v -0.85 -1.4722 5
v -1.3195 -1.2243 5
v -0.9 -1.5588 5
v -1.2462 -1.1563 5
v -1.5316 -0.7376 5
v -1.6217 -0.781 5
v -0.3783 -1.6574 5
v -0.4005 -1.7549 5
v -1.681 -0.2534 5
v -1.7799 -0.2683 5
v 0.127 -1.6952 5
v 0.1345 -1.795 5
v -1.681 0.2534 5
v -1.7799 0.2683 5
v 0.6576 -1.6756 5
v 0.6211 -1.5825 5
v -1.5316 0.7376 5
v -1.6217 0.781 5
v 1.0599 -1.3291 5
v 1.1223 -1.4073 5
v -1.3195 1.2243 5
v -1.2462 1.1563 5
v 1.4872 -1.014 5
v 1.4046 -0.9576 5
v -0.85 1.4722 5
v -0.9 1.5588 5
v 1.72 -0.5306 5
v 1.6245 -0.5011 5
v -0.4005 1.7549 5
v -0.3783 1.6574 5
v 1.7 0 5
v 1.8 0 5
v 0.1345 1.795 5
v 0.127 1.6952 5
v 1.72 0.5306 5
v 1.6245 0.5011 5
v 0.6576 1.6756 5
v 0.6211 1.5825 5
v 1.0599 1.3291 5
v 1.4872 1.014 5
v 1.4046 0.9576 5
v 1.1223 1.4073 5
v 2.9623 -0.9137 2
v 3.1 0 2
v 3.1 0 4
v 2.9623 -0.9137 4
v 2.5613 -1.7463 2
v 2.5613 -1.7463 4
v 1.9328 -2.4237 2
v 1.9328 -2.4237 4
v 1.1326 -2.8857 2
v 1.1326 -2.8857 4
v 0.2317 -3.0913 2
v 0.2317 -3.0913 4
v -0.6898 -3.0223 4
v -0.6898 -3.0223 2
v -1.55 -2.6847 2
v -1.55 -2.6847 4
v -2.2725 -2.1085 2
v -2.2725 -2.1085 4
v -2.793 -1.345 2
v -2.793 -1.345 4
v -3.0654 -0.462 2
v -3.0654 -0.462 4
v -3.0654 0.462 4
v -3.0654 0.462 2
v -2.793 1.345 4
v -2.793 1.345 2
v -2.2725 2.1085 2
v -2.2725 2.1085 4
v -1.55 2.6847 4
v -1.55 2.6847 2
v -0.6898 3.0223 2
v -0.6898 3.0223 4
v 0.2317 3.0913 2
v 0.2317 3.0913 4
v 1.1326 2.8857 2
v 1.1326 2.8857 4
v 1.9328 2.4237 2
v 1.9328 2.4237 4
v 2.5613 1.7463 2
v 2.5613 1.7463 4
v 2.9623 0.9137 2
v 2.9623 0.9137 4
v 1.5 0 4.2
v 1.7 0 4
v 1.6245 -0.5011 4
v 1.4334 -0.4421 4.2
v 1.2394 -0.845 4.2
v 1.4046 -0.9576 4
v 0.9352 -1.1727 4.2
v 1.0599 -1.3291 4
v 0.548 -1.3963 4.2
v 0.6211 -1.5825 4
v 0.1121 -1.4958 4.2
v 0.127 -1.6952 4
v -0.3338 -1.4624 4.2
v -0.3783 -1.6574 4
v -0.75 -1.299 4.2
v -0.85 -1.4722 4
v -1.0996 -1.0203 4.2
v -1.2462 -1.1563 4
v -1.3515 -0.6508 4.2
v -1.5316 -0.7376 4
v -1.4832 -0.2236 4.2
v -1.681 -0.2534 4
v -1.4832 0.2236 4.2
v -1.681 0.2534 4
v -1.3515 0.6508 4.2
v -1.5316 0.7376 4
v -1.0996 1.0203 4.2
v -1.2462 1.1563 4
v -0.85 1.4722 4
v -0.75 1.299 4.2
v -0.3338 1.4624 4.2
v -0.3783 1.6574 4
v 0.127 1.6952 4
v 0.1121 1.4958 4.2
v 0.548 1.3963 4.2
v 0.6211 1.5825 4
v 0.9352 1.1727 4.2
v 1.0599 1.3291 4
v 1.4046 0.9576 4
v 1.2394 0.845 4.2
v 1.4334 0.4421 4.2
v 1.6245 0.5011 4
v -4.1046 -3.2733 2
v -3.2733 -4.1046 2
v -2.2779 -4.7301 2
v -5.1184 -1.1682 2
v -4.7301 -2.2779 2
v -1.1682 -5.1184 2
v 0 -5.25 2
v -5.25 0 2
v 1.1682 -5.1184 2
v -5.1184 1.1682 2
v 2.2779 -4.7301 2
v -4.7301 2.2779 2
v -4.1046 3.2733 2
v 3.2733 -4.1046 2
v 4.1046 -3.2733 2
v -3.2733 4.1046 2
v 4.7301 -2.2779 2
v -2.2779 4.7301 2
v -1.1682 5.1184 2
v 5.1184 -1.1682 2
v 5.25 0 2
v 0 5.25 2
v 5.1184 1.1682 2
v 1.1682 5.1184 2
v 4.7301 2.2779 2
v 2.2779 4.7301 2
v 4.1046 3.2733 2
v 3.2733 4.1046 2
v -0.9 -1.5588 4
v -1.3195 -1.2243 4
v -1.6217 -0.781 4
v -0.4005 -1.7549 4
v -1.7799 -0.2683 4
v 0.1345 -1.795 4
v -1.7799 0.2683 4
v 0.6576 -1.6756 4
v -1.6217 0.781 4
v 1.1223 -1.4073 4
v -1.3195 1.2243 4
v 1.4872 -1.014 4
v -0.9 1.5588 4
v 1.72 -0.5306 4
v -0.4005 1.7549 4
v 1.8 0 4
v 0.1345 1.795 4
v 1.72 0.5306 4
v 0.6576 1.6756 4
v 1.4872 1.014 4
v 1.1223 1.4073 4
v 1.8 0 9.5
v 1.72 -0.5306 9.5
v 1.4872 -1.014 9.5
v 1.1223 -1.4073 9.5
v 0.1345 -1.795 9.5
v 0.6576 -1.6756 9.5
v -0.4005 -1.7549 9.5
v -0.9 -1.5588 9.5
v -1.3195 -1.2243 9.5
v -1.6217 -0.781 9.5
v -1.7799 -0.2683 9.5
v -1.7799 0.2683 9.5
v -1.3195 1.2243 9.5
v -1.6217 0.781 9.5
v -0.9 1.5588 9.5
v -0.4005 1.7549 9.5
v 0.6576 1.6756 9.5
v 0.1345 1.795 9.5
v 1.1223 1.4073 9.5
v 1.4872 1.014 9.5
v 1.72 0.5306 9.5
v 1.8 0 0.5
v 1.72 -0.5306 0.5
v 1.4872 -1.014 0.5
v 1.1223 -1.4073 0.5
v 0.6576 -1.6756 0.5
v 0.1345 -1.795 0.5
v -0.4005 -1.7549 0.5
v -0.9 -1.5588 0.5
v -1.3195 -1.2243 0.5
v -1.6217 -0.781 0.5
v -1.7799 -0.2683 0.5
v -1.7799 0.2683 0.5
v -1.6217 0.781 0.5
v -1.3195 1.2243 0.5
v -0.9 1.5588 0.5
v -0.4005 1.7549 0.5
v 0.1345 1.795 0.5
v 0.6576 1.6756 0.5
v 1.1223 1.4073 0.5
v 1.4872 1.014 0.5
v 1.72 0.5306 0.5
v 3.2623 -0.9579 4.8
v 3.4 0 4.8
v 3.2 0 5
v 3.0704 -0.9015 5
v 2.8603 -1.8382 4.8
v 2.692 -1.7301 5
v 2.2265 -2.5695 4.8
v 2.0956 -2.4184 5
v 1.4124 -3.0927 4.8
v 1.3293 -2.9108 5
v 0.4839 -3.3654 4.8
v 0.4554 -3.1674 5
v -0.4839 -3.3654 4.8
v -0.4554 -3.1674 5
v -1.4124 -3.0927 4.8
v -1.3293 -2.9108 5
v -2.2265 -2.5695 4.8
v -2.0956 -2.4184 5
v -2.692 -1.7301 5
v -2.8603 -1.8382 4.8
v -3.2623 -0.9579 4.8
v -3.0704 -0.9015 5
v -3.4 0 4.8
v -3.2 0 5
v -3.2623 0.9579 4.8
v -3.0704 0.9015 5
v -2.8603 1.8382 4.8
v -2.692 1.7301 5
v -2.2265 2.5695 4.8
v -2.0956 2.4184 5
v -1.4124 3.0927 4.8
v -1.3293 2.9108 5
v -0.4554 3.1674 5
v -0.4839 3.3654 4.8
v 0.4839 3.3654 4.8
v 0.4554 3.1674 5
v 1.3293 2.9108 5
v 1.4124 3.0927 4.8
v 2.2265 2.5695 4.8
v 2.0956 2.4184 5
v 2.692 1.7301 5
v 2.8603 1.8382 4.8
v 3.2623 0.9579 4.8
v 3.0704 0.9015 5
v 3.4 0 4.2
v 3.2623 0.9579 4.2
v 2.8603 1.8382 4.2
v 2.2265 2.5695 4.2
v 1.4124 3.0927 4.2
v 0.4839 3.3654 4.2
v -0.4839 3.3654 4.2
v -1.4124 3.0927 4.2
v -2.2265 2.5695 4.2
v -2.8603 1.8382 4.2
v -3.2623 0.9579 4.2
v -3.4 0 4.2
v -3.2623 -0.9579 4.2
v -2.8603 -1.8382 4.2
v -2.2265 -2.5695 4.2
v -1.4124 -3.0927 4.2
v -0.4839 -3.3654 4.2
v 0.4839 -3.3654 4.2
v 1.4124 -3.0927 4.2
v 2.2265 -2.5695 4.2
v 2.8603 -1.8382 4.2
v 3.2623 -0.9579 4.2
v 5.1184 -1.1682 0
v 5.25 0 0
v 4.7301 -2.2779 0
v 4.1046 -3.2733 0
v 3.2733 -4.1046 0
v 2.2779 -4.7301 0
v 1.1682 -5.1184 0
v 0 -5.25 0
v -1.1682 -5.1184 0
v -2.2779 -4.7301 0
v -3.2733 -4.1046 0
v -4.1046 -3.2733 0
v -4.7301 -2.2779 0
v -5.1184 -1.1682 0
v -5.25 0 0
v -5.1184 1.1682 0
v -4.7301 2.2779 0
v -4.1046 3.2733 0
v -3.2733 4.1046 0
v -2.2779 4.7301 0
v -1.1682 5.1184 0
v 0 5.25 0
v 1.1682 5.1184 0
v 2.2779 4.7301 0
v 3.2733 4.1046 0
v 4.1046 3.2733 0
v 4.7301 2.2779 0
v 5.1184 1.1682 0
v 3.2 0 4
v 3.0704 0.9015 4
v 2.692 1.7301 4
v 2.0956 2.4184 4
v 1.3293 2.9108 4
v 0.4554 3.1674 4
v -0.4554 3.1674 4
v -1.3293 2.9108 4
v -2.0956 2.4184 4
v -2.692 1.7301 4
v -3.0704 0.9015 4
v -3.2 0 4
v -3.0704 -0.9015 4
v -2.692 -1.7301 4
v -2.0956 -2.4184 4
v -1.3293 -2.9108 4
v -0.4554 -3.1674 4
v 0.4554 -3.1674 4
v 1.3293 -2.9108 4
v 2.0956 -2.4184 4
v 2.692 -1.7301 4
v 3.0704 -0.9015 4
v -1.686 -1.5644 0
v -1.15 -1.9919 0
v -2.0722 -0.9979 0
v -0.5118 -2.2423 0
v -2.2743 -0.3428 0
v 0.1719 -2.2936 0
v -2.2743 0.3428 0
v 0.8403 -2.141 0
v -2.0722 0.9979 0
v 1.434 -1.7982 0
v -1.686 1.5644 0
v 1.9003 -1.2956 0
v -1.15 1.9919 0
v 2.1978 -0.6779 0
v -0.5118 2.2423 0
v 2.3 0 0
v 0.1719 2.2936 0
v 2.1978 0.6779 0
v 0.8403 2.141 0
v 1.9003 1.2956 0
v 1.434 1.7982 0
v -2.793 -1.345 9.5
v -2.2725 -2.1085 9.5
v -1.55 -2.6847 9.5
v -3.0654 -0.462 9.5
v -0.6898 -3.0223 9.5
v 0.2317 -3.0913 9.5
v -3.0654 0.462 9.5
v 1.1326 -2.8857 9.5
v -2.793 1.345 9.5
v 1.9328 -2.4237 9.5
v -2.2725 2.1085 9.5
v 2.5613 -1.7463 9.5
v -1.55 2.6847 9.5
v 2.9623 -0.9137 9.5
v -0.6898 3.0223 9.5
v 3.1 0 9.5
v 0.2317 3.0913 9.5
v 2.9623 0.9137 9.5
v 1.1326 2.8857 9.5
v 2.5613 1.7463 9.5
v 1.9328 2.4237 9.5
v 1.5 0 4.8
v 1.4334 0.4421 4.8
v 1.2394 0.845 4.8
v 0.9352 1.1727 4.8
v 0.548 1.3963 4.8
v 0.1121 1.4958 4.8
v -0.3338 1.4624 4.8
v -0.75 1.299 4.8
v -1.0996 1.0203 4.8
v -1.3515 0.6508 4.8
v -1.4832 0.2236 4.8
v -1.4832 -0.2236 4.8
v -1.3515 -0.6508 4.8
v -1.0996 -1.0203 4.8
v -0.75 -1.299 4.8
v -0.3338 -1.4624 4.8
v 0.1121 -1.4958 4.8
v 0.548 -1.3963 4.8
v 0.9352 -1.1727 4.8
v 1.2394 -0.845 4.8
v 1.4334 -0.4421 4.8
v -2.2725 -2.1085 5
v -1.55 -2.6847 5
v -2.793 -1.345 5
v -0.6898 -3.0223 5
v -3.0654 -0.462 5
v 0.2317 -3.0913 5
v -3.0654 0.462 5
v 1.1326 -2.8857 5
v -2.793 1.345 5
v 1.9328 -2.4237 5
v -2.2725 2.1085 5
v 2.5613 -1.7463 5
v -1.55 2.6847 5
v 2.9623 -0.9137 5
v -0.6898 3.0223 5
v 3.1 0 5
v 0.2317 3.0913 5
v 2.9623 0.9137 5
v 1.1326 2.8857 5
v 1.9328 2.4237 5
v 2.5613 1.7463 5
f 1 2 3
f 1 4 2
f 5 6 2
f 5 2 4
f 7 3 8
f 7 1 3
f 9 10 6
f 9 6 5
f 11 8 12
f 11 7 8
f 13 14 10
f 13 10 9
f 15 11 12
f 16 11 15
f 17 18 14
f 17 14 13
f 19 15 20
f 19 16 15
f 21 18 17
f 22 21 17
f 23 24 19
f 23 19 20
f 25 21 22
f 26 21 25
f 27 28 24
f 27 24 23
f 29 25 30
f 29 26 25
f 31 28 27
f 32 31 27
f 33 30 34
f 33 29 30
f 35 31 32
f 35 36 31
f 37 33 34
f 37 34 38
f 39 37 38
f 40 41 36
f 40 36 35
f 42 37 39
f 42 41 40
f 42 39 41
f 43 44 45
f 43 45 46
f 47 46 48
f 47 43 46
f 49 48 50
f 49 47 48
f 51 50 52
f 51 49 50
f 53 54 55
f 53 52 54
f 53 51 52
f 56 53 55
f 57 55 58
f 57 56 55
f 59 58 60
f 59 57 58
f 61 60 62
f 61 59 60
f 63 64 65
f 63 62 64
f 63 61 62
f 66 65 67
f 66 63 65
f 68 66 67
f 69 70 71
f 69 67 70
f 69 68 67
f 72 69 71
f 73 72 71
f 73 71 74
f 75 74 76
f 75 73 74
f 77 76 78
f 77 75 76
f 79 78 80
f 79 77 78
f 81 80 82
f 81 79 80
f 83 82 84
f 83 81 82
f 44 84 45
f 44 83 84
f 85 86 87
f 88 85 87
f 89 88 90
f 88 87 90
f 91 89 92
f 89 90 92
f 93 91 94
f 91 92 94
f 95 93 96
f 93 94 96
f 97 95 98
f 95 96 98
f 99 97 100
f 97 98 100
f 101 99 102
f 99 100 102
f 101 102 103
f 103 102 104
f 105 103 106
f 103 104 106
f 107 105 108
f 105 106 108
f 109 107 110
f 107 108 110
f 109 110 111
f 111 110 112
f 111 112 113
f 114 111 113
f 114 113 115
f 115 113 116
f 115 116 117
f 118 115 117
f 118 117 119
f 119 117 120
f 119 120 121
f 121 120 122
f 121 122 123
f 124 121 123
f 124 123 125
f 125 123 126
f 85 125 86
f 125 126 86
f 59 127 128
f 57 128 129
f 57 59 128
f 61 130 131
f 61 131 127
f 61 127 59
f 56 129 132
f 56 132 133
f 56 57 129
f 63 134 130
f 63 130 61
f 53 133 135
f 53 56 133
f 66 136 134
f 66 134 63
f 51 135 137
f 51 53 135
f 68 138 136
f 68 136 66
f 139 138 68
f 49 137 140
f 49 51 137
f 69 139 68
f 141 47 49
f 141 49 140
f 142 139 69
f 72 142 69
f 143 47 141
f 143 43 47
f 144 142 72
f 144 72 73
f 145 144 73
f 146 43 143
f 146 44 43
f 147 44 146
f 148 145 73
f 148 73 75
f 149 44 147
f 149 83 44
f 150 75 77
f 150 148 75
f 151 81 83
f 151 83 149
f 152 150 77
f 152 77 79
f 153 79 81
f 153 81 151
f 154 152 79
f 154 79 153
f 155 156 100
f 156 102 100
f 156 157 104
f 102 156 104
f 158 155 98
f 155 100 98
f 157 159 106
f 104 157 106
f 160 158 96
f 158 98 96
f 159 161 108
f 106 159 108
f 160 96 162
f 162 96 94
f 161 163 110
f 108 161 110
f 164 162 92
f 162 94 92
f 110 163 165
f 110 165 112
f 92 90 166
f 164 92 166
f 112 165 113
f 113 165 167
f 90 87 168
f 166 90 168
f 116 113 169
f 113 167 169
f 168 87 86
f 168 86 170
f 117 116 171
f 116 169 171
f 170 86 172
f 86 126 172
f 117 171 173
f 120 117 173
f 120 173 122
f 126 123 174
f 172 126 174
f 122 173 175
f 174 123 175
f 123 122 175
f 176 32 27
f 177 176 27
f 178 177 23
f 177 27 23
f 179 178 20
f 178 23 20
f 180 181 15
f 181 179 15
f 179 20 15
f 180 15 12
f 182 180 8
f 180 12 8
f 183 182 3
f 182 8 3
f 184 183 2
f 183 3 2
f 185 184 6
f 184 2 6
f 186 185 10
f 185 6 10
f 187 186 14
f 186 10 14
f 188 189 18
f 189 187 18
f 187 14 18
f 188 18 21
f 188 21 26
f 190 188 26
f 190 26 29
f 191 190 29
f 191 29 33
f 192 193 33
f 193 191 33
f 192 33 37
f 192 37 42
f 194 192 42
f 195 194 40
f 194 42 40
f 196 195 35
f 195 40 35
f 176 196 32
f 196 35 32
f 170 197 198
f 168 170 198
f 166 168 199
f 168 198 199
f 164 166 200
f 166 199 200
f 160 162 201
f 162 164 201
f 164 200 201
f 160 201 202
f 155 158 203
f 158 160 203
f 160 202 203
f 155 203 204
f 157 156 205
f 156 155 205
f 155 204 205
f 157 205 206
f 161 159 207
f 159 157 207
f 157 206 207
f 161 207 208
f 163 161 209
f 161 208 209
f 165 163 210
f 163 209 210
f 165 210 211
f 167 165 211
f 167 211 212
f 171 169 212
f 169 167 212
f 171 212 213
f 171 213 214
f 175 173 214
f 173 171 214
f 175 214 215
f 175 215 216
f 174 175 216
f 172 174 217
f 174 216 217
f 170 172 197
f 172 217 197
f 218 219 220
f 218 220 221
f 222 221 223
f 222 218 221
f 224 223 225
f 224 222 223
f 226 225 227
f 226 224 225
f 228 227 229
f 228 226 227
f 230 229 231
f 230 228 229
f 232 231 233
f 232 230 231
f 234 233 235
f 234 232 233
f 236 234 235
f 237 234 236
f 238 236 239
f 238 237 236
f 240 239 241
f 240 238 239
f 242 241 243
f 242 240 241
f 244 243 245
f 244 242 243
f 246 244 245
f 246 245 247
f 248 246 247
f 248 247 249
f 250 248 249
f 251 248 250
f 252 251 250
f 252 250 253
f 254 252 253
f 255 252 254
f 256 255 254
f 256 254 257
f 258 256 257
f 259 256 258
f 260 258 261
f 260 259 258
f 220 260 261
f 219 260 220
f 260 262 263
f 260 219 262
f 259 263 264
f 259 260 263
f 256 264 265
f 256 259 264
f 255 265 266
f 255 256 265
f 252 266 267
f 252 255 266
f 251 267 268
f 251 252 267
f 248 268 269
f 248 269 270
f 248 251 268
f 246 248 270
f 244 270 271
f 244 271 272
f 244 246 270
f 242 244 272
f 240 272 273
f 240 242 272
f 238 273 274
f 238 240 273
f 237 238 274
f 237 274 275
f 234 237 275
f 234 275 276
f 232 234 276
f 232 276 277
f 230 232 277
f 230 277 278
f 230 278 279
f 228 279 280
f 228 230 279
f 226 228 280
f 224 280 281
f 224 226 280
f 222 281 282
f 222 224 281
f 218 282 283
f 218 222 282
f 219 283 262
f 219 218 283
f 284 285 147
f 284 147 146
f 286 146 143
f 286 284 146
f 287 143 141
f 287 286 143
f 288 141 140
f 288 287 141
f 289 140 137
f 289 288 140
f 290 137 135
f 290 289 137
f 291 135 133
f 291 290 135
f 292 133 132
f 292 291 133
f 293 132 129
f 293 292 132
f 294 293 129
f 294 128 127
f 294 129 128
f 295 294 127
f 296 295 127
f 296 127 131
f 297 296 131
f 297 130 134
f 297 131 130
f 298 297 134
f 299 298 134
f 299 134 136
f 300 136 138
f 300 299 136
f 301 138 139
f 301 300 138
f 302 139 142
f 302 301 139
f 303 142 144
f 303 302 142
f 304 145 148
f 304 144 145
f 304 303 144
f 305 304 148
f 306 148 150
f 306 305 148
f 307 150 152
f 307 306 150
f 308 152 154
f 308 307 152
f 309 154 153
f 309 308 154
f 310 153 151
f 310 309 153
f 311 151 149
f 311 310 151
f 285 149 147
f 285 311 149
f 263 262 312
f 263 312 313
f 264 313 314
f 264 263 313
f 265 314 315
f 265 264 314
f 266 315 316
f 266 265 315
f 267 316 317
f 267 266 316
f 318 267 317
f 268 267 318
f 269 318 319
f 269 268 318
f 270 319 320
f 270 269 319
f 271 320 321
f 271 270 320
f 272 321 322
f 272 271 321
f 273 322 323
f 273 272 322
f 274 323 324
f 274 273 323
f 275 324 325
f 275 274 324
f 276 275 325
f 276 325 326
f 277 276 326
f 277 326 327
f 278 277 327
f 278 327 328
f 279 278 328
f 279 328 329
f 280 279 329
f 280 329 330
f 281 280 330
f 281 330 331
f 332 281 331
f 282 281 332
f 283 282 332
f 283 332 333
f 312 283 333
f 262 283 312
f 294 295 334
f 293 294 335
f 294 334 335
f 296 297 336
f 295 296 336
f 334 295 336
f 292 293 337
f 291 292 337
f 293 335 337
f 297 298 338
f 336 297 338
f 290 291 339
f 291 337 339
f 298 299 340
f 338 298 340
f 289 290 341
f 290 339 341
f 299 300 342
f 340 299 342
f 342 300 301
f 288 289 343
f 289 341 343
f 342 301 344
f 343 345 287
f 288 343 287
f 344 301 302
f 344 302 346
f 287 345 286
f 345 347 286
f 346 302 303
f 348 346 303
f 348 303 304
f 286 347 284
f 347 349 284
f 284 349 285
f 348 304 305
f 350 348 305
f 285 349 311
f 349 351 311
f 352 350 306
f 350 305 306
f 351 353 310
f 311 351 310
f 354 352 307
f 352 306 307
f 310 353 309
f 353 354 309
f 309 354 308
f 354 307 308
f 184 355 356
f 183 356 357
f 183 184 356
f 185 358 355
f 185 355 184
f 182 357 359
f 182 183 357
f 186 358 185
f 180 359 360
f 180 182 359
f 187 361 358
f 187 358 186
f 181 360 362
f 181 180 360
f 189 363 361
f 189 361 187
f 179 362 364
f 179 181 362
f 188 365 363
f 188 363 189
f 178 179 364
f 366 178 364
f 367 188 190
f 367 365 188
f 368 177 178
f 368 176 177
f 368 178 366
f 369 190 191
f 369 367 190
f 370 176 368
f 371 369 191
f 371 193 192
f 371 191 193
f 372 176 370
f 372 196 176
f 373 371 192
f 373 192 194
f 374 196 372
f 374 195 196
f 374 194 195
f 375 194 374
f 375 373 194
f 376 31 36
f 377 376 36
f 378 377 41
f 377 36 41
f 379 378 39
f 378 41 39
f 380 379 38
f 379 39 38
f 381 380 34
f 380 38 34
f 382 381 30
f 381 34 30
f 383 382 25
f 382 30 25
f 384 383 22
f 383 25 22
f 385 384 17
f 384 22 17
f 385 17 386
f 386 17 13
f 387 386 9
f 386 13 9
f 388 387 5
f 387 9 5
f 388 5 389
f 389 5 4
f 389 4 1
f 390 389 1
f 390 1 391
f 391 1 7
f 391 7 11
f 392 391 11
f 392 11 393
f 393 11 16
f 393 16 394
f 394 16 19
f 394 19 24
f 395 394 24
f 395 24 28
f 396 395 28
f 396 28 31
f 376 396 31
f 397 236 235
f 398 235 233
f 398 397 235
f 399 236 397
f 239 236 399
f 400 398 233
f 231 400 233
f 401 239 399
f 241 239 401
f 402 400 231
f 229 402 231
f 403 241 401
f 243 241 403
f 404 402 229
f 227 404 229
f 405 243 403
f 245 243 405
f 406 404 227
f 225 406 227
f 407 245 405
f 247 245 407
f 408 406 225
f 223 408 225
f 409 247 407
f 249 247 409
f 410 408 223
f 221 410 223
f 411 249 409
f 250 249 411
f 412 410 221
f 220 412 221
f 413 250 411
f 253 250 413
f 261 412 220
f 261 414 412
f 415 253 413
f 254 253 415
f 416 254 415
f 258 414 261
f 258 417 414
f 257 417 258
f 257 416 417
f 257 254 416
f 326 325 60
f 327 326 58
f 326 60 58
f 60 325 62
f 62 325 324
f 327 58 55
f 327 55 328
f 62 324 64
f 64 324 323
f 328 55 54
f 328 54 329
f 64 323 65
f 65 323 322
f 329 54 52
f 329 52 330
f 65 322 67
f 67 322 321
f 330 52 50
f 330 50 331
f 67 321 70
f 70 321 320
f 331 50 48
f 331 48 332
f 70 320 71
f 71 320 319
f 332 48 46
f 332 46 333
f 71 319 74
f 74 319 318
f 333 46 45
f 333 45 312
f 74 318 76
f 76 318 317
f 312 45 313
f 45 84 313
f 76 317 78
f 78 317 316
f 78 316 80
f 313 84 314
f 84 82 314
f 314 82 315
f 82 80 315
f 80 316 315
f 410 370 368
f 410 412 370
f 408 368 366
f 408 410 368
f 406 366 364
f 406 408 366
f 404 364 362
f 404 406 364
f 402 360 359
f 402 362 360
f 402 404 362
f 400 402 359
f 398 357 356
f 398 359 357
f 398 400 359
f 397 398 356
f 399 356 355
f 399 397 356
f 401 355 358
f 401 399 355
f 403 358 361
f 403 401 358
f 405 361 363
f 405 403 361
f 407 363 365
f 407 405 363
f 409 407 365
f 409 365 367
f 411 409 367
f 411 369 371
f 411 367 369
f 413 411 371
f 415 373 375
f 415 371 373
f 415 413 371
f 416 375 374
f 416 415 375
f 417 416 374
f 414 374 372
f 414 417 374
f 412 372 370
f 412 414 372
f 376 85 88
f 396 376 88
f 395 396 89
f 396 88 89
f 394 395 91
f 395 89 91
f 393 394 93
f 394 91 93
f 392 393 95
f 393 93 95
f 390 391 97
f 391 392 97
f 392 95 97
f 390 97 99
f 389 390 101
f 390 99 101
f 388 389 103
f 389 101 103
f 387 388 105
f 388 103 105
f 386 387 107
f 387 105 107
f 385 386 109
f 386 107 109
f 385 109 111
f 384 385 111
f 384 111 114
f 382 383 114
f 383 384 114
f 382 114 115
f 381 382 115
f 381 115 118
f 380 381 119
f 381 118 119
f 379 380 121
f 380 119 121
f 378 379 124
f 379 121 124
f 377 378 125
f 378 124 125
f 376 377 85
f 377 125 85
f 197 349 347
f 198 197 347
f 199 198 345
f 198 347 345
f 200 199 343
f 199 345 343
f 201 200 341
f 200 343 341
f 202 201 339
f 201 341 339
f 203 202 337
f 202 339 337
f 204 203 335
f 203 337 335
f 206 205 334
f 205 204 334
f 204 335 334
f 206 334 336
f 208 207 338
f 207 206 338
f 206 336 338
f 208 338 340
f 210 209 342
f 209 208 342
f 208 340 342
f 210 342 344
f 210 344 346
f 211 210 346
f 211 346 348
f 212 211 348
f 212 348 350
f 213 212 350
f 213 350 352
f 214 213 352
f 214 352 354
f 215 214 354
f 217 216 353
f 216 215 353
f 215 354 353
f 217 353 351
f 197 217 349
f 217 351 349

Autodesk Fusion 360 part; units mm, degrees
sketch "Sketch1" plane through (0, 0, 0) normal (0, 0, 1) x (1, 0, 0)
  circle A0 centre (0, 0) radius 5.25
  circle A1 centre (0, 0) radius 3.1
  circle A2 centre (0, 0) radius 1.8
  circle A3 centre (0, 0) radius 3.4
  circle A4 centre (0, 0) radius 1.5
  dimension "d1" = 10.5
  dimension "d2" = 6.2
  dimension "d3" = 3.6
  dimension "d21" = 0.3
  dimension "d22" = 0.3
extrude "Extrude1" add sketch "Sketch1" along normal blind 9.5 contours A1
extrude "Extrude2" add sketch "Sketch1" along normal blind 2 contours A0 | A3
extrude "Extrude3" add sketch "Sketch1" along normal blind 4 and the other way blind -5 contours A3
chamfer "Chamfer1" distance 0.2 angle 45 2 edges at (-3.1699, -1.2295, 4) (-3.1699, -1.2295, 5)
chamfer "Chamfer2" distance 0.5 angle 45 1 edges at (-1.6782, 0.6509, 0)
extrude "Extrude4" add sketch "Sketch1" along normal blind 5 and the other way blind -4 contours A2
chamfer "Chamfer3" distance 0.2 angle 45 2 edges at (-1.3985, 0.5424, 5) (-1.3985, 0.5424, 4)
equation "d2 = OuterRadius"
equation "d3 = InnerRadius"
equation "d21 = NotchThickness"
equation "d22 = NotchThickness"
equation "InnerRadius = 3.6 mm"
equation "OuterRadius = 6.2 mm"
equation "NotchThickness = 0.30 mm"
